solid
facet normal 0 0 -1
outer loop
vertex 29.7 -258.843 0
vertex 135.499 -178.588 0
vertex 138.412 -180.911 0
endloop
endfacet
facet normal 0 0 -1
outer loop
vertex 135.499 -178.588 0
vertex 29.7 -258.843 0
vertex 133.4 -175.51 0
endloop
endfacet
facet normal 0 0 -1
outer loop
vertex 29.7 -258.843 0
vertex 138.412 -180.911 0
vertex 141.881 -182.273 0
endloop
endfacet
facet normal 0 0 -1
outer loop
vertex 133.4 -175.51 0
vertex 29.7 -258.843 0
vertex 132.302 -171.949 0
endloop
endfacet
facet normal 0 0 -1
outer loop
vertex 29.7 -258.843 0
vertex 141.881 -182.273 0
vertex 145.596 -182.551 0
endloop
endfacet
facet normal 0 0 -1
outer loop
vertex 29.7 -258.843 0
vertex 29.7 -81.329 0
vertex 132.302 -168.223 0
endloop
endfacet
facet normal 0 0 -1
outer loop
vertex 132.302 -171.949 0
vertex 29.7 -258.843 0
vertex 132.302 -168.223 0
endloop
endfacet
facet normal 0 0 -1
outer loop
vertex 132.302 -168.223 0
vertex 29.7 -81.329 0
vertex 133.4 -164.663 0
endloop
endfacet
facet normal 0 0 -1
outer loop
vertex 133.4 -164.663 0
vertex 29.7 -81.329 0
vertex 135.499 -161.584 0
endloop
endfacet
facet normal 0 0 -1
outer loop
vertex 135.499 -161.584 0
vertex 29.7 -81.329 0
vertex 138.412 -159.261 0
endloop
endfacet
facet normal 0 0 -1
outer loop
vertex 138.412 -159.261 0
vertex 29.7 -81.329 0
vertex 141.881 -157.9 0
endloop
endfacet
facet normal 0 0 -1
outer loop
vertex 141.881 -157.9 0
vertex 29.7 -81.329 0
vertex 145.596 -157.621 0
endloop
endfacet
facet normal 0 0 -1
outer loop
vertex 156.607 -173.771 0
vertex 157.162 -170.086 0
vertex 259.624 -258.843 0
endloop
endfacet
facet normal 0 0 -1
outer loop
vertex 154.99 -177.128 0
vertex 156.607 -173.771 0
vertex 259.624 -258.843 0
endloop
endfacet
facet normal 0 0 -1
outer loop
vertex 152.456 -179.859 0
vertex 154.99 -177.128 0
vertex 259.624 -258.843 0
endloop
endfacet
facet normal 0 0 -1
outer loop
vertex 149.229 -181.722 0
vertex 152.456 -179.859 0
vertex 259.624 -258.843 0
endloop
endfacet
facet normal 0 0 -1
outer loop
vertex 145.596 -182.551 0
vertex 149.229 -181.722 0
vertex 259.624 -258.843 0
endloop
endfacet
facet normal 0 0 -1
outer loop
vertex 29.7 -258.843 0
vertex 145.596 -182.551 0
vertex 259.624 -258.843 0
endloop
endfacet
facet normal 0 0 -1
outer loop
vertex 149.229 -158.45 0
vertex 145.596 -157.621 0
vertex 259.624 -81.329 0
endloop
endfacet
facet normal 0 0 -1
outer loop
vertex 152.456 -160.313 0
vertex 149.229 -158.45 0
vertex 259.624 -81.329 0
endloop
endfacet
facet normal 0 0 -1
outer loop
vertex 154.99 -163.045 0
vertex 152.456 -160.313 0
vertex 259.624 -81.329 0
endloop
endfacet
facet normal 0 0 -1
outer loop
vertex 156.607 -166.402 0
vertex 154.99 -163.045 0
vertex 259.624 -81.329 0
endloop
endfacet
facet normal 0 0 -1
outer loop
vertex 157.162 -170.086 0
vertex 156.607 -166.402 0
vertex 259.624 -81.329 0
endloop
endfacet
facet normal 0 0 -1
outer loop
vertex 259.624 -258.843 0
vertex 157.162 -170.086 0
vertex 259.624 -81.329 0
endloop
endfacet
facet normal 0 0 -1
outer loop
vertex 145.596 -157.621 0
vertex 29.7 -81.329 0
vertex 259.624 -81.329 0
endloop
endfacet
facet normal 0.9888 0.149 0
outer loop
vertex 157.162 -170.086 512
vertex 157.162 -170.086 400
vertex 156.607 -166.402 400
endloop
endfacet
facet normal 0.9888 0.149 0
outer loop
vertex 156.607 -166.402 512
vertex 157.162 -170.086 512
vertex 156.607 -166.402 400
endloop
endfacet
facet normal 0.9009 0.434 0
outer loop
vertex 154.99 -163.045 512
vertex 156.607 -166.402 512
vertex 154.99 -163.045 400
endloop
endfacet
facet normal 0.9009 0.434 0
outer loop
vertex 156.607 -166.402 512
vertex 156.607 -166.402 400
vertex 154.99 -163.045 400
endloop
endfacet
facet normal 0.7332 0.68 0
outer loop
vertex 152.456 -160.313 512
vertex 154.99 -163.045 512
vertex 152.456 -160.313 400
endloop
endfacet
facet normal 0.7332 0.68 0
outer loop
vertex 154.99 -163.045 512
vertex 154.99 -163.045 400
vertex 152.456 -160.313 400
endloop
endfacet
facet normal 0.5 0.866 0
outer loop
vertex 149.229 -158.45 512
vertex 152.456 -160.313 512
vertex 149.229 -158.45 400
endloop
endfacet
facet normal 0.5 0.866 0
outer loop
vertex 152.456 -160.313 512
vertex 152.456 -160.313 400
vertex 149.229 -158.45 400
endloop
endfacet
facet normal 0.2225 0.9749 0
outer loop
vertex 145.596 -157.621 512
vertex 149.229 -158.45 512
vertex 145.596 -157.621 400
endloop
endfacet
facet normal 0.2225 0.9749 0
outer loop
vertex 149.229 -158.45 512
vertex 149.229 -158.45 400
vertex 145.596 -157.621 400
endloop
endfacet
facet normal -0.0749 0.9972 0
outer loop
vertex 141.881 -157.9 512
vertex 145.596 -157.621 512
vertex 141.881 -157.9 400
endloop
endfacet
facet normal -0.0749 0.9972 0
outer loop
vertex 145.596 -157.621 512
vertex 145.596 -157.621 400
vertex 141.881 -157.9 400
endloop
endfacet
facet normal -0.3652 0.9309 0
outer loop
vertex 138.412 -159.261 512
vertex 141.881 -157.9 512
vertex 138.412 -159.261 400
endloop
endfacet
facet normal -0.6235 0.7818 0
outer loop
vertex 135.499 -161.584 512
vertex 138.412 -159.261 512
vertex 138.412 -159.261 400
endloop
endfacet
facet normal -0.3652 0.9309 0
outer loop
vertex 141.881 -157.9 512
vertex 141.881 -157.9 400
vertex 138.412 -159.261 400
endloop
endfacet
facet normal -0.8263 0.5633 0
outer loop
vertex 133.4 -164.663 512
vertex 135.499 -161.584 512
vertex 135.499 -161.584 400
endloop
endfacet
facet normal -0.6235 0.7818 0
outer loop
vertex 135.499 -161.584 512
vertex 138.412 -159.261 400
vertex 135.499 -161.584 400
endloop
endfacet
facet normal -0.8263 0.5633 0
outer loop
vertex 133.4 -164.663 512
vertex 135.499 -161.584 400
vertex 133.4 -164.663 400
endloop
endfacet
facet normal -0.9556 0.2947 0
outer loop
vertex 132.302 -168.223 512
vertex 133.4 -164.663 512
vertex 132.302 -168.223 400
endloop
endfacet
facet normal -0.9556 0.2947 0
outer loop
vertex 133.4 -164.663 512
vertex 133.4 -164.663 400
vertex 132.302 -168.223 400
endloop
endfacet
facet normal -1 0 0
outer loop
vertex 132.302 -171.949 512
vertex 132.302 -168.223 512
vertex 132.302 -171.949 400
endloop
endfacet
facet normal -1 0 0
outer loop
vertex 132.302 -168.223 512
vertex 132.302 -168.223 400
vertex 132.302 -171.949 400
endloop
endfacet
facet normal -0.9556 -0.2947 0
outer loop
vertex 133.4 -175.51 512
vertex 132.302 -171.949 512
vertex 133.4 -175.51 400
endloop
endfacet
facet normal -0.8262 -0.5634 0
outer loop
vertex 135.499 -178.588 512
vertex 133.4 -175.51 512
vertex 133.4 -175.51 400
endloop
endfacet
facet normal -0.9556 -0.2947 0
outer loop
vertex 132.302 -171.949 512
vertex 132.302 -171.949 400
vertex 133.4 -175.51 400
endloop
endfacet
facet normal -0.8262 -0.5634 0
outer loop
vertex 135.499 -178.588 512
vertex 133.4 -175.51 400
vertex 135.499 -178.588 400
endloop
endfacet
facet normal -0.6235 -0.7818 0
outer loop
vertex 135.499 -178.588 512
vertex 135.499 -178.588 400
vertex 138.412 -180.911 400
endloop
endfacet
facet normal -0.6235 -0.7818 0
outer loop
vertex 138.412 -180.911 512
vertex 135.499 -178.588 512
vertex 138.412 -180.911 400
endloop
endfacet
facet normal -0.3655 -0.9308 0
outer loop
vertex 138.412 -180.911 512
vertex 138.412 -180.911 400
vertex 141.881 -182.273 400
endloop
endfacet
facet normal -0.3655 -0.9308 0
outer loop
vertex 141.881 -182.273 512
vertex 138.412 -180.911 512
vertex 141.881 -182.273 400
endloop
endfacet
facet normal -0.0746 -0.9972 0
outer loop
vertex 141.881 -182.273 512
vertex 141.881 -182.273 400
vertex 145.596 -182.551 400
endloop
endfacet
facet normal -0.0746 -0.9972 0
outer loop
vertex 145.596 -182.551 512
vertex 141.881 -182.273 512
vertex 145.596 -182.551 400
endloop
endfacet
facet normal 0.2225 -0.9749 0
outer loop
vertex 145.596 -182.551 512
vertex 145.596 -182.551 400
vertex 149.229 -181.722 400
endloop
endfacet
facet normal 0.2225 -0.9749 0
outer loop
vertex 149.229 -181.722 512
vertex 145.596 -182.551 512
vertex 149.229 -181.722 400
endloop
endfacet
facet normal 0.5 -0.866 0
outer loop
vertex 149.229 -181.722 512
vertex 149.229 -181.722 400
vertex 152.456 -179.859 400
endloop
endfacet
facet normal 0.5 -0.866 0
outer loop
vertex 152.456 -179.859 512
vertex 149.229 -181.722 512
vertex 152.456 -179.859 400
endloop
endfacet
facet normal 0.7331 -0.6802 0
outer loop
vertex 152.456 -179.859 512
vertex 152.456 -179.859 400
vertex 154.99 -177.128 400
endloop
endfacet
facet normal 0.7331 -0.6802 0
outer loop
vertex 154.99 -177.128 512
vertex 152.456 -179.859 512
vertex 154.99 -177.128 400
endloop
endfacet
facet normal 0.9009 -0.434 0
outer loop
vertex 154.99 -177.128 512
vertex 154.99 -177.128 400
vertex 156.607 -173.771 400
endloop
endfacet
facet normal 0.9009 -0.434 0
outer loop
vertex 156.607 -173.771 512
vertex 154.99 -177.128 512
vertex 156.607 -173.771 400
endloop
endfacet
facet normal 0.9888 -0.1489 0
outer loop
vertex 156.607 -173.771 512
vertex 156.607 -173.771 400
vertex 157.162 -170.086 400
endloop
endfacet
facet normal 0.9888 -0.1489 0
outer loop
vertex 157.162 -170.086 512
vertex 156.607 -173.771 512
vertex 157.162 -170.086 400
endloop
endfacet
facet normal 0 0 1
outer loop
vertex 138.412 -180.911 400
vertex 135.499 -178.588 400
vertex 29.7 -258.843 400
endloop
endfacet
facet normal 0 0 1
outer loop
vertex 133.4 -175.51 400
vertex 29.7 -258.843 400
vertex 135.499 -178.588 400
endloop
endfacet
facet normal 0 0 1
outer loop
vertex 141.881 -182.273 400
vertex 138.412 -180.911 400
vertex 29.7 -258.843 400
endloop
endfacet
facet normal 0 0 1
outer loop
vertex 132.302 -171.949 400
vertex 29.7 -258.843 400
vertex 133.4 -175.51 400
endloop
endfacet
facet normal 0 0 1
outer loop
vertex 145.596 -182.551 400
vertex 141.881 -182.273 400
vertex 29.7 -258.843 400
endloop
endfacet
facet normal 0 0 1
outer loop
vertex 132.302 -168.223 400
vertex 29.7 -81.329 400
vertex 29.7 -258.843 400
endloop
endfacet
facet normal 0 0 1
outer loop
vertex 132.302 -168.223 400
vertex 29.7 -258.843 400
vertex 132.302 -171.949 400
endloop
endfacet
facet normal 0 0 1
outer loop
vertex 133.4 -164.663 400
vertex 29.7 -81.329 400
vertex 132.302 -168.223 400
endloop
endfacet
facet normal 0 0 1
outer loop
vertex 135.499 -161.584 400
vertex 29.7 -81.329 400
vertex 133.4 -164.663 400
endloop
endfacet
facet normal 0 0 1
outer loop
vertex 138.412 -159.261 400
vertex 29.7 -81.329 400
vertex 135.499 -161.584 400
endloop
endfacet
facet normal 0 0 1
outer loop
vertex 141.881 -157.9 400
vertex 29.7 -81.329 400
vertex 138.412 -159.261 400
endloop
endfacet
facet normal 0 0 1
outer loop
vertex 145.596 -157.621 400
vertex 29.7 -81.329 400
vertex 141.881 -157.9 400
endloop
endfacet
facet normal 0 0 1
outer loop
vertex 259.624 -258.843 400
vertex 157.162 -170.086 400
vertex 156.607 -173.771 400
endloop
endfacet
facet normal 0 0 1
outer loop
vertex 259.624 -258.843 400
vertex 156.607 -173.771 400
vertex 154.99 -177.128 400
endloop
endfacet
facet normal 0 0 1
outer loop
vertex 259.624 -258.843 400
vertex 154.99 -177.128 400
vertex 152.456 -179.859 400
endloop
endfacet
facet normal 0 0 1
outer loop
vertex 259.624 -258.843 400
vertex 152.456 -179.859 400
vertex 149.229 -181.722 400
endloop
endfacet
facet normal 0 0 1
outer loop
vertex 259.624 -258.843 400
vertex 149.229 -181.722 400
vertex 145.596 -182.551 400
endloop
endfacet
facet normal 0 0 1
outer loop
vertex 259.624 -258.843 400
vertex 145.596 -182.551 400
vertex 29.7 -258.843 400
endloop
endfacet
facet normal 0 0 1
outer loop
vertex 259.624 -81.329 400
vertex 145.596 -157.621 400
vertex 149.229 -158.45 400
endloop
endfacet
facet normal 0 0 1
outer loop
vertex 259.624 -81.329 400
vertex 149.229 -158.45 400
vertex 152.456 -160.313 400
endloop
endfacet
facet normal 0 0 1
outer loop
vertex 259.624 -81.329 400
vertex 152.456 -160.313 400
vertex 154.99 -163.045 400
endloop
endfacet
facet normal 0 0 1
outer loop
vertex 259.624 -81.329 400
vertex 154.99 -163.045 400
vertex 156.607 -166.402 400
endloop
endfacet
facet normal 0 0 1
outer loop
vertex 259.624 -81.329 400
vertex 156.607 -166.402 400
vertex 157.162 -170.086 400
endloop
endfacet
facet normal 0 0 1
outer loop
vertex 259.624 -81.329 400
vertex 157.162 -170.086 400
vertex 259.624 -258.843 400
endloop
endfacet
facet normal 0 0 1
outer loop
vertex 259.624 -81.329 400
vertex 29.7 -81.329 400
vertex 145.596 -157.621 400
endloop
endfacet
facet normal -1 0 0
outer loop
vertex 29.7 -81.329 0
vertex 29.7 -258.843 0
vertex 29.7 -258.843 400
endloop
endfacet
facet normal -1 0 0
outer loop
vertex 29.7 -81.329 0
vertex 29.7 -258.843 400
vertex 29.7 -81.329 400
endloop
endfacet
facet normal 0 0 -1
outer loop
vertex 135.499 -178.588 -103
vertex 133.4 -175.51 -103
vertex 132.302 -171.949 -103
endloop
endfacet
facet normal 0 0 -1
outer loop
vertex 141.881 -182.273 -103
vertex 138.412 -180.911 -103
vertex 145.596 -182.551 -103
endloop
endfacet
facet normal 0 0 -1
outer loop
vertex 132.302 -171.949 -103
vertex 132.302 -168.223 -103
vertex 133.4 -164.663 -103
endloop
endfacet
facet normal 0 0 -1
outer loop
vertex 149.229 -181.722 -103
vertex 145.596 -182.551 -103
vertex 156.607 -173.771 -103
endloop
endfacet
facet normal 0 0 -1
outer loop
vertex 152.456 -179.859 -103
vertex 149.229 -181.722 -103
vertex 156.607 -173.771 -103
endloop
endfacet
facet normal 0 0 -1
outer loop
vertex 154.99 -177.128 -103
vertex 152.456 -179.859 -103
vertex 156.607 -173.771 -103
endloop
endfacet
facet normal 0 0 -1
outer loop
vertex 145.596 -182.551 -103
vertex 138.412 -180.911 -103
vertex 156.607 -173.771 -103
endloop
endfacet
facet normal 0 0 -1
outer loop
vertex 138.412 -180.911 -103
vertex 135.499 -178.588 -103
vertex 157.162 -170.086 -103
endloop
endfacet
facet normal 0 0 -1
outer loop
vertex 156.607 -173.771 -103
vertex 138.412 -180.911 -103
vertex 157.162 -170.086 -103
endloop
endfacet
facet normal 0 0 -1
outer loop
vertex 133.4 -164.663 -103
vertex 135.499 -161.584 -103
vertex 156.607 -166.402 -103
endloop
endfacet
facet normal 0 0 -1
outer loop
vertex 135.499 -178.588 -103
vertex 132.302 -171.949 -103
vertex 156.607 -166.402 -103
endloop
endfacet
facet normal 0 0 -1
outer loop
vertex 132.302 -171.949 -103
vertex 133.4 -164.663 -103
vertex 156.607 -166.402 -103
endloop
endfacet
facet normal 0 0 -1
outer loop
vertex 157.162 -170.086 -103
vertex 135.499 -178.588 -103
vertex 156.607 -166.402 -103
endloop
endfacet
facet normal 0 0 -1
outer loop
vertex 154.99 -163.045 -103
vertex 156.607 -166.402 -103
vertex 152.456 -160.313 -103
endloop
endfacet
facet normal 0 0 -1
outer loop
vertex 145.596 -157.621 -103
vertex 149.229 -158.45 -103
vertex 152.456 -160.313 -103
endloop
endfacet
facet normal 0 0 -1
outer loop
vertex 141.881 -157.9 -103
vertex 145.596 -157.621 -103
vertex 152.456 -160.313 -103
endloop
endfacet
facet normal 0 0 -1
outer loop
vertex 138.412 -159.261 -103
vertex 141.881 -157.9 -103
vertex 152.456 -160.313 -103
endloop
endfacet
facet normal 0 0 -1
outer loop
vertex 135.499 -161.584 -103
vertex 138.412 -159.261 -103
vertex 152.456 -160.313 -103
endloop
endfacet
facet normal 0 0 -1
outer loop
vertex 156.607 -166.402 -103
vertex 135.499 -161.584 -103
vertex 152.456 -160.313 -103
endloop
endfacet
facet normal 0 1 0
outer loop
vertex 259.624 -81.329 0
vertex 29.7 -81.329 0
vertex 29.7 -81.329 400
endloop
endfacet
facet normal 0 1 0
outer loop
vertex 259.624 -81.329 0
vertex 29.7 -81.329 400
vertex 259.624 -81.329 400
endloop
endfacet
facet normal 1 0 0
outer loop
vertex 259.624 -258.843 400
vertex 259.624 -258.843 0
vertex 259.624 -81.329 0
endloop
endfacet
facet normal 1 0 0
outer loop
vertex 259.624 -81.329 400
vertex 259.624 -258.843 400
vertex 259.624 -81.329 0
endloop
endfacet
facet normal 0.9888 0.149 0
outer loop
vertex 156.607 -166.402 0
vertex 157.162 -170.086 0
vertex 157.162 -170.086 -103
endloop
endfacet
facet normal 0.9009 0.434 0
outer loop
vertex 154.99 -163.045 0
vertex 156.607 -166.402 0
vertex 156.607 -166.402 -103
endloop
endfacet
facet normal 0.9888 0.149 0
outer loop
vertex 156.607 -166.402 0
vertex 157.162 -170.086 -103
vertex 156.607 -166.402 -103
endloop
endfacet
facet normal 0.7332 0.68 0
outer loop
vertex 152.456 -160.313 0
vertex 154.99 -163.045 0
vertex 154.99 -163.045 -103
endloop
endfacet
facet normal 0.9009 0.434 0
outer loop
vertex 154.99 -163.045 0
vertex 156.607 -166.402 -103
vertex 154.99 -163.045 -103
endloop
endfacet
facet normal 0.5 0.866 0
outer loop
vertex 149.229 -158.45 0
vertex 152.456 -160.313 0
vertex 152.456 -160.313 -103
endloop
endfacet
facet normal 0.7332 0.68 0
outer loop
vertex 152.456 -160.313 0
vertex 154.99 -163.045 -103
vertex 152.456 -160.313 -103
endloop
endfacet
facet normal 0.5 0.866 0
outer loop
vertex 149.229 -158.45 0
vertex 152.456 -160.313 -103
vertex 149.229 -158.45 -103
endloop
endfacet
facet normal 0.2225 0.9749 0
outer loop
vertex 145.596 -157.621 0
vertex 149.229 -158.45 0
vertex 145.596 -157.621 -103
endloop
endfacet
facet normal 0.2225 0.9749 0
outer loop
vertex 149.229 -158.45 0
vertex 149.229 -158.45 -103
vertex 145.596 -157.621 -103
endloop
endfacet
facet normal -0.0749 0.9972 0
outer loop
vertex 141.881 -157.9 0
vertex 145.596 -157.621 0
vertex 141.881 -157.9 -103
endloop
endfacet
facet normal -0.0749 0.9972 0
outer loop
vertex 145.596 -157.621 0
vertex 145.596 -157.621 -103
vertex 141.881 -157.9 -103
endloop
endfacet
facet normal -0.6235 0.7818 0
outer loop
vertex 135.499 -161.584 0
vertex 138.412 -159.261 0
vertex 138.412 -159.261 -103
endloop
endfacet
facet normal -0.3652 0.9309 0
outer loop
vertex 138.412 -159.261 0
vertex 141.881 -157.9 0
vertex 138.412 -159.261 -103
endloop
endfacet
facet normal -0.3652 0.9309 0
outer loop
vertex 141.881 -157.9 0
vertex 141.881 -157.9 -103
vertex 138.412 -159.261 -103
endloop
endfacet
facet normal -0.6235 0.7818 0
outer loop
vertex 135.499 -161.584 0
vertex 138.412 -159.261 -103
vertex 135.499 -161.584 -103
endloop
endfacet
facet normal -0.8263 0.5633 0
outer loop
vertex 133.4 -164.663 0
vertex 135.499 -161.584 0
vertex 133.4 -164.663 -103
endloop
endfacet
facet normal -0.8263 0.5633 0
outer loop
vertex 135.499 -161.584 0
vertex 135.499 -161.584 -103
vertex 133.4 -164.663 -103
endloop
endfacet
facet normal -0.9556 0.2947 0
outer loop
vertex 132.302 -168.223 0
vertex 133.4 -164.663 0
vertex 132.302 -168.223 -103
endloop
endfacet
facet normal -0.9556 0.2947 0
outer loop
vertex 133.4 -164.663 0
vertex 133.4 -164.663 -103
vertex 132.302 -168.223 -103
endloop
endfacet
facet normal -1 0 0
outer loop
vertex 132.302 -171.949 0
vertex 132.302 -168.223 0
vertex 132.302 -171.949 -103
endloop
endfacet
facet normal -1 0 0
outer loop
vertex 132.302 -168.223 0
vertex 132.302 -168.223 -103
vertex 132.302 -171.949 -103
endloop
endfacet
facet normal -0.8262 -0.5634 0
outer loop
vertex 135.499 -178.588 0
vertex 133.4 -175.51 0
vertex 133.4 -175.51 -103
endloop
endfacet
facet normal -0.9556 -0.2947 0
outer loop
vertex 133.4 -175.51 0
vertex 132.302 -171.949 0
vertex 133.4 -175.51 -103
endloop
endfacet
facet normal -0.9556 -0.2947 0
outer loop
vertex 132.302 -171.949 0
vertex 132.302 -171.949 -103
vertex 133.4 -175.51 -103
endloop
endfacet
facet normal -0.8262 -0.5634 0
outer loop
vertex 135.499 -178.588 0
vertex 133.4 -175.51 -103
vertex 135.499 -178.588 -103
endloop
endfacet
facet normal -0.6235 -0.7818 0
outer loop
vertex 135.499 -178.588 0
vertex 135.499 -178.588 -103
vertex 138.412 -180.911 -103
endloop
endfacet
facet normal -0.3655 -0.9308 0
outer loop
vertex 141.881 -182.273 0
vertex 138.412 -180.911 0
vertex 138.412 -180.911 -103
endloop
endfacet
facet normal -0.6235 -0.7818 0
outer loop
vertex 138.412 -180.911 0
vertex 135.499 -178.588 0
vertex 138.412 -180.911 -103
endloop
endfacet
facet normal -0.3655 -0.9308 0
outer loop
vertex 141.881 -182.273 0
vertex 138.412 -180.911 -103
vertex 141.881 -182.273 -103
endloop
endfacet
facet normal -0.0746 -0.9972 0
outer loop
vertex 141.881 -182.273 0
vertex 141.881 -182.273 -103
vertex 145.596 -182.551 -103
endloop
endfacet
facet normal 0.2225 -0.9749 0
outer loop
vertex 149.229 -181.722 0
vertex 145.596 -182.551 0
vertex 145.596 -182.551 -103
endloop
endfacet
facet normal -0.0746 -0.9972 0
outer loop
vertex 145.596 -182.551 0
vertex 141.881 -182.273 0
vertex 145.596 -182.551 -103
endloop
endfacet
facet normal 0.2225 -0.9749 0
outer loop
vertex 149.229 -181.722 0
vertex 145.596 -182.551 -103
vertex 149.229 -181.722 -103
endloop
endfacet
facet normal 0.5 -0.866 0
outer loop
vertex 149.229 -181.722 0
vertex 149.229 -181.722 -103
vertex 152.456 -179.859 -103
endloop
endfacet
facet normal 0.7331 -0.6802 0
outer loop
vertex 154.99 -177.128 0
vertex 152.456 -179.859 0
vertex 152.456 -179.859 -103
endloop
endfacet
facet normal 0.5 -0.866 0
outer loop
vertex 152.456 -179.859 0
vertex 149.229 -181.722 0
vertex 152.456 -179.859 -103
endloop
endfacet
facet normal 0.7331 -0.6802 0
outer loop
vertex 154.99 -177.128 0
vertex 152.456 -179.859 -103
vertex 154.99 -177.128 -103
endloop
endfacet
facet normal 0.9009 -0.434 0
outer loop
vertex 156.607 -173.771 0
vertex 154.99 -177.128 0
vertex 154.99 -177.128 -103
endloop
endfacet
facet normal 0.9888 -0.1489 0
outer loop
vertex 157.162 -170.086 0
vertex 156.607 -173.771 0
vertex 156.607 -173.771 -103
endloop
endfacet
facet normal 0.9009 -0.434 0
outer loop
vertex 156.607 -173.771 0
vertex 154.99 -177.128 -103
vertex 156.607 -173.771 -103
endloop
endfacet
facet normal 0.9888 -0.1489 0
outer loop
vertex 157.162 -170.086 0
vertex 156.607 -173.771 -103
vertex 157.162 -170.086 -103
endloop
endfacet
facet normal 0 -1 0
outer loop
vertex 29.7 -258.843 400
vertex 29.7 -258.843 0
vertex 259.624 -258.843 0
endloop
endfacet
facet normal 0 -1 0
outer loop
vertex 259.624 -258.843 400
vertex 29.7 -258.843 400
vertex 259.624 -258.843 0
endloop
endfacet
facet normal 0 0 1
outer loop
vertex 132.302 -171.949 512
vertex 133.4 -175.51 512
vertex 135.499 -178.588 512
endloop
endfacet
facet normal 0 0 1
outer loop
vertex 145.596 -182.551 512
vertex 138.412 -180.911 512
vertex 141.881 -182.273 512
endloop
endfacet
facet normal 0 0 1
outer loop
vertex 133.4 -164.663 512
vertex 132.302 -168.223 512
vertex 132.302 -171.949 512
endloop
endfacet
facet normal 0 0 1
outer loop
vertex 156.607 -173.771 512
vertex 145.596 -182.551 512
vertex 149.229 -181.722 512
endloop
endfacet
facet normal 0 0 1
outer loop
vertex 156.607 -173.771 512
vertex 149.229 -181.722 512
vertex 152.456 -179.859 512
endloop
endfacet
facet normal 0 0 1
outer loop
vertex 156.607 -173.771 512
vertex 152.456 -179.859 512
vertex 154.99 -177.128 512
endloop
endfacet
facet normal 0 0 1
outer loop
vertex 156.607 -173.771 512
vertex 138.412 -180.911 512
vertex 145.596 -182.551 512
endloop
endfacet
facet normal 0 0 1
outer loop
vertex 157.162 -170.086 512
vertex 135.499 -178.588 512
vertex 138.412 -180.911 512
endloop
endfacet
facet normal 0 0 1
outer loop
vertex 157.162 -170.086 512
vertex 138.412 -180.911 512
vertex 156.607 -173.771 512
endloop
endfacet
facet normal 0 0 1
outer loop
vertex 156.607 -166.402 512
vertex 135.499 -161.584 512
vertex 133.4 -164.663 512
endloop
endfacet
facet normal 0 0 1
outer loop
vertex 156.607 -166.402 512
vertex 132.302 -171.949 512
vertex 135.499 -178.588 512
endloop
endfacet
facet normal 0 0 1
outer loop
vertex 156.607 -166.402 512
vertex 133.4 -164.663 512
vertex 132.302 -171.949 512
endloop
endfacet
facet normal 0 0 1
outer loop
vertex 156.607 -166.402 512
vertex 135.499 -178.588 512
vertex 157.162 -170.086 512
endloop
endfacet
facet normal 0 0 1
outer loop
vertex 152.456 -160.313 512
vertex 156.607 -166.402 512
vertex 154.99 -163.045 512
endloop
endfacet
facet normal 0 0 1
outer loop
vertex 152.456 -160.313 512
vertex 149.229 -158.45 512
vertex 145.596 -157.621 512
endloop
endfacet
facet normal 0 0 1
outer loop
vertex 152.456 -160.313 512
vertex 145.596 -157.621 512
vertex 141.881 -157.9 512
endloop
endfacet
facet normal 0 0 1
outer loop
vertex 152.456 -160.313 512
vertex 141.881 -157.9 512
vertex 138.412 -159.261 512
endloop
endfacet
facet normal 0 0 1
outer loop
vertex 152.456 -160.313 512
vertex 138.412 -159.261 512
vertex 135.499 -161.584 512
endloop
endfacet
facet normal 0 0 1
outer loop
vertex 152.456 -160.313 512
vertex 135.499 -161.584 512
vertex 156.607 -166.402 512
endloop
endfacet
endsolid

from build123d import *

# Parameters (mm, degrees)
SKETCH1_W                = 229.923881951
SKETCH1_H                = 177.514761801
BOSS_EXTRUDE1_DEPTH      = 400
BOSS_EXTRUDE2_DEPTH      = 112
BOSS_EXTRUDE2_DEPTH_BACK = 503
SKETCH2_R                = 12.5


with BuildPart() as part:
    # Sketch1 → Boss-Extrude1 (new body)
    with BuildSketch(Plane.XY):
        with Locations((144.662099629, -170.086101065)):
            Rectangle(SKETCH1_W, SKETCH1_H)
    extrude(amount=BOSS_EXTRUDE1_DEPTH)

    # Sketch2 → Boss-Extrude2 (add, two sides: drawn at the far end of the back side and taken through both)
    with BuildSketch(Plane.XY.offset(400).offset(-BOSS_EXTRUDE2_DEPTH_BACK)):
        with Locations((144.662099628, -170.086101065)):
            Circle(SKETCH2_R)
    extrude(amount=BOSS_EXTRUDE2_DEPTH + BOSS_EXTRUDE2_DEPTH_BACK)


solid = part.part
